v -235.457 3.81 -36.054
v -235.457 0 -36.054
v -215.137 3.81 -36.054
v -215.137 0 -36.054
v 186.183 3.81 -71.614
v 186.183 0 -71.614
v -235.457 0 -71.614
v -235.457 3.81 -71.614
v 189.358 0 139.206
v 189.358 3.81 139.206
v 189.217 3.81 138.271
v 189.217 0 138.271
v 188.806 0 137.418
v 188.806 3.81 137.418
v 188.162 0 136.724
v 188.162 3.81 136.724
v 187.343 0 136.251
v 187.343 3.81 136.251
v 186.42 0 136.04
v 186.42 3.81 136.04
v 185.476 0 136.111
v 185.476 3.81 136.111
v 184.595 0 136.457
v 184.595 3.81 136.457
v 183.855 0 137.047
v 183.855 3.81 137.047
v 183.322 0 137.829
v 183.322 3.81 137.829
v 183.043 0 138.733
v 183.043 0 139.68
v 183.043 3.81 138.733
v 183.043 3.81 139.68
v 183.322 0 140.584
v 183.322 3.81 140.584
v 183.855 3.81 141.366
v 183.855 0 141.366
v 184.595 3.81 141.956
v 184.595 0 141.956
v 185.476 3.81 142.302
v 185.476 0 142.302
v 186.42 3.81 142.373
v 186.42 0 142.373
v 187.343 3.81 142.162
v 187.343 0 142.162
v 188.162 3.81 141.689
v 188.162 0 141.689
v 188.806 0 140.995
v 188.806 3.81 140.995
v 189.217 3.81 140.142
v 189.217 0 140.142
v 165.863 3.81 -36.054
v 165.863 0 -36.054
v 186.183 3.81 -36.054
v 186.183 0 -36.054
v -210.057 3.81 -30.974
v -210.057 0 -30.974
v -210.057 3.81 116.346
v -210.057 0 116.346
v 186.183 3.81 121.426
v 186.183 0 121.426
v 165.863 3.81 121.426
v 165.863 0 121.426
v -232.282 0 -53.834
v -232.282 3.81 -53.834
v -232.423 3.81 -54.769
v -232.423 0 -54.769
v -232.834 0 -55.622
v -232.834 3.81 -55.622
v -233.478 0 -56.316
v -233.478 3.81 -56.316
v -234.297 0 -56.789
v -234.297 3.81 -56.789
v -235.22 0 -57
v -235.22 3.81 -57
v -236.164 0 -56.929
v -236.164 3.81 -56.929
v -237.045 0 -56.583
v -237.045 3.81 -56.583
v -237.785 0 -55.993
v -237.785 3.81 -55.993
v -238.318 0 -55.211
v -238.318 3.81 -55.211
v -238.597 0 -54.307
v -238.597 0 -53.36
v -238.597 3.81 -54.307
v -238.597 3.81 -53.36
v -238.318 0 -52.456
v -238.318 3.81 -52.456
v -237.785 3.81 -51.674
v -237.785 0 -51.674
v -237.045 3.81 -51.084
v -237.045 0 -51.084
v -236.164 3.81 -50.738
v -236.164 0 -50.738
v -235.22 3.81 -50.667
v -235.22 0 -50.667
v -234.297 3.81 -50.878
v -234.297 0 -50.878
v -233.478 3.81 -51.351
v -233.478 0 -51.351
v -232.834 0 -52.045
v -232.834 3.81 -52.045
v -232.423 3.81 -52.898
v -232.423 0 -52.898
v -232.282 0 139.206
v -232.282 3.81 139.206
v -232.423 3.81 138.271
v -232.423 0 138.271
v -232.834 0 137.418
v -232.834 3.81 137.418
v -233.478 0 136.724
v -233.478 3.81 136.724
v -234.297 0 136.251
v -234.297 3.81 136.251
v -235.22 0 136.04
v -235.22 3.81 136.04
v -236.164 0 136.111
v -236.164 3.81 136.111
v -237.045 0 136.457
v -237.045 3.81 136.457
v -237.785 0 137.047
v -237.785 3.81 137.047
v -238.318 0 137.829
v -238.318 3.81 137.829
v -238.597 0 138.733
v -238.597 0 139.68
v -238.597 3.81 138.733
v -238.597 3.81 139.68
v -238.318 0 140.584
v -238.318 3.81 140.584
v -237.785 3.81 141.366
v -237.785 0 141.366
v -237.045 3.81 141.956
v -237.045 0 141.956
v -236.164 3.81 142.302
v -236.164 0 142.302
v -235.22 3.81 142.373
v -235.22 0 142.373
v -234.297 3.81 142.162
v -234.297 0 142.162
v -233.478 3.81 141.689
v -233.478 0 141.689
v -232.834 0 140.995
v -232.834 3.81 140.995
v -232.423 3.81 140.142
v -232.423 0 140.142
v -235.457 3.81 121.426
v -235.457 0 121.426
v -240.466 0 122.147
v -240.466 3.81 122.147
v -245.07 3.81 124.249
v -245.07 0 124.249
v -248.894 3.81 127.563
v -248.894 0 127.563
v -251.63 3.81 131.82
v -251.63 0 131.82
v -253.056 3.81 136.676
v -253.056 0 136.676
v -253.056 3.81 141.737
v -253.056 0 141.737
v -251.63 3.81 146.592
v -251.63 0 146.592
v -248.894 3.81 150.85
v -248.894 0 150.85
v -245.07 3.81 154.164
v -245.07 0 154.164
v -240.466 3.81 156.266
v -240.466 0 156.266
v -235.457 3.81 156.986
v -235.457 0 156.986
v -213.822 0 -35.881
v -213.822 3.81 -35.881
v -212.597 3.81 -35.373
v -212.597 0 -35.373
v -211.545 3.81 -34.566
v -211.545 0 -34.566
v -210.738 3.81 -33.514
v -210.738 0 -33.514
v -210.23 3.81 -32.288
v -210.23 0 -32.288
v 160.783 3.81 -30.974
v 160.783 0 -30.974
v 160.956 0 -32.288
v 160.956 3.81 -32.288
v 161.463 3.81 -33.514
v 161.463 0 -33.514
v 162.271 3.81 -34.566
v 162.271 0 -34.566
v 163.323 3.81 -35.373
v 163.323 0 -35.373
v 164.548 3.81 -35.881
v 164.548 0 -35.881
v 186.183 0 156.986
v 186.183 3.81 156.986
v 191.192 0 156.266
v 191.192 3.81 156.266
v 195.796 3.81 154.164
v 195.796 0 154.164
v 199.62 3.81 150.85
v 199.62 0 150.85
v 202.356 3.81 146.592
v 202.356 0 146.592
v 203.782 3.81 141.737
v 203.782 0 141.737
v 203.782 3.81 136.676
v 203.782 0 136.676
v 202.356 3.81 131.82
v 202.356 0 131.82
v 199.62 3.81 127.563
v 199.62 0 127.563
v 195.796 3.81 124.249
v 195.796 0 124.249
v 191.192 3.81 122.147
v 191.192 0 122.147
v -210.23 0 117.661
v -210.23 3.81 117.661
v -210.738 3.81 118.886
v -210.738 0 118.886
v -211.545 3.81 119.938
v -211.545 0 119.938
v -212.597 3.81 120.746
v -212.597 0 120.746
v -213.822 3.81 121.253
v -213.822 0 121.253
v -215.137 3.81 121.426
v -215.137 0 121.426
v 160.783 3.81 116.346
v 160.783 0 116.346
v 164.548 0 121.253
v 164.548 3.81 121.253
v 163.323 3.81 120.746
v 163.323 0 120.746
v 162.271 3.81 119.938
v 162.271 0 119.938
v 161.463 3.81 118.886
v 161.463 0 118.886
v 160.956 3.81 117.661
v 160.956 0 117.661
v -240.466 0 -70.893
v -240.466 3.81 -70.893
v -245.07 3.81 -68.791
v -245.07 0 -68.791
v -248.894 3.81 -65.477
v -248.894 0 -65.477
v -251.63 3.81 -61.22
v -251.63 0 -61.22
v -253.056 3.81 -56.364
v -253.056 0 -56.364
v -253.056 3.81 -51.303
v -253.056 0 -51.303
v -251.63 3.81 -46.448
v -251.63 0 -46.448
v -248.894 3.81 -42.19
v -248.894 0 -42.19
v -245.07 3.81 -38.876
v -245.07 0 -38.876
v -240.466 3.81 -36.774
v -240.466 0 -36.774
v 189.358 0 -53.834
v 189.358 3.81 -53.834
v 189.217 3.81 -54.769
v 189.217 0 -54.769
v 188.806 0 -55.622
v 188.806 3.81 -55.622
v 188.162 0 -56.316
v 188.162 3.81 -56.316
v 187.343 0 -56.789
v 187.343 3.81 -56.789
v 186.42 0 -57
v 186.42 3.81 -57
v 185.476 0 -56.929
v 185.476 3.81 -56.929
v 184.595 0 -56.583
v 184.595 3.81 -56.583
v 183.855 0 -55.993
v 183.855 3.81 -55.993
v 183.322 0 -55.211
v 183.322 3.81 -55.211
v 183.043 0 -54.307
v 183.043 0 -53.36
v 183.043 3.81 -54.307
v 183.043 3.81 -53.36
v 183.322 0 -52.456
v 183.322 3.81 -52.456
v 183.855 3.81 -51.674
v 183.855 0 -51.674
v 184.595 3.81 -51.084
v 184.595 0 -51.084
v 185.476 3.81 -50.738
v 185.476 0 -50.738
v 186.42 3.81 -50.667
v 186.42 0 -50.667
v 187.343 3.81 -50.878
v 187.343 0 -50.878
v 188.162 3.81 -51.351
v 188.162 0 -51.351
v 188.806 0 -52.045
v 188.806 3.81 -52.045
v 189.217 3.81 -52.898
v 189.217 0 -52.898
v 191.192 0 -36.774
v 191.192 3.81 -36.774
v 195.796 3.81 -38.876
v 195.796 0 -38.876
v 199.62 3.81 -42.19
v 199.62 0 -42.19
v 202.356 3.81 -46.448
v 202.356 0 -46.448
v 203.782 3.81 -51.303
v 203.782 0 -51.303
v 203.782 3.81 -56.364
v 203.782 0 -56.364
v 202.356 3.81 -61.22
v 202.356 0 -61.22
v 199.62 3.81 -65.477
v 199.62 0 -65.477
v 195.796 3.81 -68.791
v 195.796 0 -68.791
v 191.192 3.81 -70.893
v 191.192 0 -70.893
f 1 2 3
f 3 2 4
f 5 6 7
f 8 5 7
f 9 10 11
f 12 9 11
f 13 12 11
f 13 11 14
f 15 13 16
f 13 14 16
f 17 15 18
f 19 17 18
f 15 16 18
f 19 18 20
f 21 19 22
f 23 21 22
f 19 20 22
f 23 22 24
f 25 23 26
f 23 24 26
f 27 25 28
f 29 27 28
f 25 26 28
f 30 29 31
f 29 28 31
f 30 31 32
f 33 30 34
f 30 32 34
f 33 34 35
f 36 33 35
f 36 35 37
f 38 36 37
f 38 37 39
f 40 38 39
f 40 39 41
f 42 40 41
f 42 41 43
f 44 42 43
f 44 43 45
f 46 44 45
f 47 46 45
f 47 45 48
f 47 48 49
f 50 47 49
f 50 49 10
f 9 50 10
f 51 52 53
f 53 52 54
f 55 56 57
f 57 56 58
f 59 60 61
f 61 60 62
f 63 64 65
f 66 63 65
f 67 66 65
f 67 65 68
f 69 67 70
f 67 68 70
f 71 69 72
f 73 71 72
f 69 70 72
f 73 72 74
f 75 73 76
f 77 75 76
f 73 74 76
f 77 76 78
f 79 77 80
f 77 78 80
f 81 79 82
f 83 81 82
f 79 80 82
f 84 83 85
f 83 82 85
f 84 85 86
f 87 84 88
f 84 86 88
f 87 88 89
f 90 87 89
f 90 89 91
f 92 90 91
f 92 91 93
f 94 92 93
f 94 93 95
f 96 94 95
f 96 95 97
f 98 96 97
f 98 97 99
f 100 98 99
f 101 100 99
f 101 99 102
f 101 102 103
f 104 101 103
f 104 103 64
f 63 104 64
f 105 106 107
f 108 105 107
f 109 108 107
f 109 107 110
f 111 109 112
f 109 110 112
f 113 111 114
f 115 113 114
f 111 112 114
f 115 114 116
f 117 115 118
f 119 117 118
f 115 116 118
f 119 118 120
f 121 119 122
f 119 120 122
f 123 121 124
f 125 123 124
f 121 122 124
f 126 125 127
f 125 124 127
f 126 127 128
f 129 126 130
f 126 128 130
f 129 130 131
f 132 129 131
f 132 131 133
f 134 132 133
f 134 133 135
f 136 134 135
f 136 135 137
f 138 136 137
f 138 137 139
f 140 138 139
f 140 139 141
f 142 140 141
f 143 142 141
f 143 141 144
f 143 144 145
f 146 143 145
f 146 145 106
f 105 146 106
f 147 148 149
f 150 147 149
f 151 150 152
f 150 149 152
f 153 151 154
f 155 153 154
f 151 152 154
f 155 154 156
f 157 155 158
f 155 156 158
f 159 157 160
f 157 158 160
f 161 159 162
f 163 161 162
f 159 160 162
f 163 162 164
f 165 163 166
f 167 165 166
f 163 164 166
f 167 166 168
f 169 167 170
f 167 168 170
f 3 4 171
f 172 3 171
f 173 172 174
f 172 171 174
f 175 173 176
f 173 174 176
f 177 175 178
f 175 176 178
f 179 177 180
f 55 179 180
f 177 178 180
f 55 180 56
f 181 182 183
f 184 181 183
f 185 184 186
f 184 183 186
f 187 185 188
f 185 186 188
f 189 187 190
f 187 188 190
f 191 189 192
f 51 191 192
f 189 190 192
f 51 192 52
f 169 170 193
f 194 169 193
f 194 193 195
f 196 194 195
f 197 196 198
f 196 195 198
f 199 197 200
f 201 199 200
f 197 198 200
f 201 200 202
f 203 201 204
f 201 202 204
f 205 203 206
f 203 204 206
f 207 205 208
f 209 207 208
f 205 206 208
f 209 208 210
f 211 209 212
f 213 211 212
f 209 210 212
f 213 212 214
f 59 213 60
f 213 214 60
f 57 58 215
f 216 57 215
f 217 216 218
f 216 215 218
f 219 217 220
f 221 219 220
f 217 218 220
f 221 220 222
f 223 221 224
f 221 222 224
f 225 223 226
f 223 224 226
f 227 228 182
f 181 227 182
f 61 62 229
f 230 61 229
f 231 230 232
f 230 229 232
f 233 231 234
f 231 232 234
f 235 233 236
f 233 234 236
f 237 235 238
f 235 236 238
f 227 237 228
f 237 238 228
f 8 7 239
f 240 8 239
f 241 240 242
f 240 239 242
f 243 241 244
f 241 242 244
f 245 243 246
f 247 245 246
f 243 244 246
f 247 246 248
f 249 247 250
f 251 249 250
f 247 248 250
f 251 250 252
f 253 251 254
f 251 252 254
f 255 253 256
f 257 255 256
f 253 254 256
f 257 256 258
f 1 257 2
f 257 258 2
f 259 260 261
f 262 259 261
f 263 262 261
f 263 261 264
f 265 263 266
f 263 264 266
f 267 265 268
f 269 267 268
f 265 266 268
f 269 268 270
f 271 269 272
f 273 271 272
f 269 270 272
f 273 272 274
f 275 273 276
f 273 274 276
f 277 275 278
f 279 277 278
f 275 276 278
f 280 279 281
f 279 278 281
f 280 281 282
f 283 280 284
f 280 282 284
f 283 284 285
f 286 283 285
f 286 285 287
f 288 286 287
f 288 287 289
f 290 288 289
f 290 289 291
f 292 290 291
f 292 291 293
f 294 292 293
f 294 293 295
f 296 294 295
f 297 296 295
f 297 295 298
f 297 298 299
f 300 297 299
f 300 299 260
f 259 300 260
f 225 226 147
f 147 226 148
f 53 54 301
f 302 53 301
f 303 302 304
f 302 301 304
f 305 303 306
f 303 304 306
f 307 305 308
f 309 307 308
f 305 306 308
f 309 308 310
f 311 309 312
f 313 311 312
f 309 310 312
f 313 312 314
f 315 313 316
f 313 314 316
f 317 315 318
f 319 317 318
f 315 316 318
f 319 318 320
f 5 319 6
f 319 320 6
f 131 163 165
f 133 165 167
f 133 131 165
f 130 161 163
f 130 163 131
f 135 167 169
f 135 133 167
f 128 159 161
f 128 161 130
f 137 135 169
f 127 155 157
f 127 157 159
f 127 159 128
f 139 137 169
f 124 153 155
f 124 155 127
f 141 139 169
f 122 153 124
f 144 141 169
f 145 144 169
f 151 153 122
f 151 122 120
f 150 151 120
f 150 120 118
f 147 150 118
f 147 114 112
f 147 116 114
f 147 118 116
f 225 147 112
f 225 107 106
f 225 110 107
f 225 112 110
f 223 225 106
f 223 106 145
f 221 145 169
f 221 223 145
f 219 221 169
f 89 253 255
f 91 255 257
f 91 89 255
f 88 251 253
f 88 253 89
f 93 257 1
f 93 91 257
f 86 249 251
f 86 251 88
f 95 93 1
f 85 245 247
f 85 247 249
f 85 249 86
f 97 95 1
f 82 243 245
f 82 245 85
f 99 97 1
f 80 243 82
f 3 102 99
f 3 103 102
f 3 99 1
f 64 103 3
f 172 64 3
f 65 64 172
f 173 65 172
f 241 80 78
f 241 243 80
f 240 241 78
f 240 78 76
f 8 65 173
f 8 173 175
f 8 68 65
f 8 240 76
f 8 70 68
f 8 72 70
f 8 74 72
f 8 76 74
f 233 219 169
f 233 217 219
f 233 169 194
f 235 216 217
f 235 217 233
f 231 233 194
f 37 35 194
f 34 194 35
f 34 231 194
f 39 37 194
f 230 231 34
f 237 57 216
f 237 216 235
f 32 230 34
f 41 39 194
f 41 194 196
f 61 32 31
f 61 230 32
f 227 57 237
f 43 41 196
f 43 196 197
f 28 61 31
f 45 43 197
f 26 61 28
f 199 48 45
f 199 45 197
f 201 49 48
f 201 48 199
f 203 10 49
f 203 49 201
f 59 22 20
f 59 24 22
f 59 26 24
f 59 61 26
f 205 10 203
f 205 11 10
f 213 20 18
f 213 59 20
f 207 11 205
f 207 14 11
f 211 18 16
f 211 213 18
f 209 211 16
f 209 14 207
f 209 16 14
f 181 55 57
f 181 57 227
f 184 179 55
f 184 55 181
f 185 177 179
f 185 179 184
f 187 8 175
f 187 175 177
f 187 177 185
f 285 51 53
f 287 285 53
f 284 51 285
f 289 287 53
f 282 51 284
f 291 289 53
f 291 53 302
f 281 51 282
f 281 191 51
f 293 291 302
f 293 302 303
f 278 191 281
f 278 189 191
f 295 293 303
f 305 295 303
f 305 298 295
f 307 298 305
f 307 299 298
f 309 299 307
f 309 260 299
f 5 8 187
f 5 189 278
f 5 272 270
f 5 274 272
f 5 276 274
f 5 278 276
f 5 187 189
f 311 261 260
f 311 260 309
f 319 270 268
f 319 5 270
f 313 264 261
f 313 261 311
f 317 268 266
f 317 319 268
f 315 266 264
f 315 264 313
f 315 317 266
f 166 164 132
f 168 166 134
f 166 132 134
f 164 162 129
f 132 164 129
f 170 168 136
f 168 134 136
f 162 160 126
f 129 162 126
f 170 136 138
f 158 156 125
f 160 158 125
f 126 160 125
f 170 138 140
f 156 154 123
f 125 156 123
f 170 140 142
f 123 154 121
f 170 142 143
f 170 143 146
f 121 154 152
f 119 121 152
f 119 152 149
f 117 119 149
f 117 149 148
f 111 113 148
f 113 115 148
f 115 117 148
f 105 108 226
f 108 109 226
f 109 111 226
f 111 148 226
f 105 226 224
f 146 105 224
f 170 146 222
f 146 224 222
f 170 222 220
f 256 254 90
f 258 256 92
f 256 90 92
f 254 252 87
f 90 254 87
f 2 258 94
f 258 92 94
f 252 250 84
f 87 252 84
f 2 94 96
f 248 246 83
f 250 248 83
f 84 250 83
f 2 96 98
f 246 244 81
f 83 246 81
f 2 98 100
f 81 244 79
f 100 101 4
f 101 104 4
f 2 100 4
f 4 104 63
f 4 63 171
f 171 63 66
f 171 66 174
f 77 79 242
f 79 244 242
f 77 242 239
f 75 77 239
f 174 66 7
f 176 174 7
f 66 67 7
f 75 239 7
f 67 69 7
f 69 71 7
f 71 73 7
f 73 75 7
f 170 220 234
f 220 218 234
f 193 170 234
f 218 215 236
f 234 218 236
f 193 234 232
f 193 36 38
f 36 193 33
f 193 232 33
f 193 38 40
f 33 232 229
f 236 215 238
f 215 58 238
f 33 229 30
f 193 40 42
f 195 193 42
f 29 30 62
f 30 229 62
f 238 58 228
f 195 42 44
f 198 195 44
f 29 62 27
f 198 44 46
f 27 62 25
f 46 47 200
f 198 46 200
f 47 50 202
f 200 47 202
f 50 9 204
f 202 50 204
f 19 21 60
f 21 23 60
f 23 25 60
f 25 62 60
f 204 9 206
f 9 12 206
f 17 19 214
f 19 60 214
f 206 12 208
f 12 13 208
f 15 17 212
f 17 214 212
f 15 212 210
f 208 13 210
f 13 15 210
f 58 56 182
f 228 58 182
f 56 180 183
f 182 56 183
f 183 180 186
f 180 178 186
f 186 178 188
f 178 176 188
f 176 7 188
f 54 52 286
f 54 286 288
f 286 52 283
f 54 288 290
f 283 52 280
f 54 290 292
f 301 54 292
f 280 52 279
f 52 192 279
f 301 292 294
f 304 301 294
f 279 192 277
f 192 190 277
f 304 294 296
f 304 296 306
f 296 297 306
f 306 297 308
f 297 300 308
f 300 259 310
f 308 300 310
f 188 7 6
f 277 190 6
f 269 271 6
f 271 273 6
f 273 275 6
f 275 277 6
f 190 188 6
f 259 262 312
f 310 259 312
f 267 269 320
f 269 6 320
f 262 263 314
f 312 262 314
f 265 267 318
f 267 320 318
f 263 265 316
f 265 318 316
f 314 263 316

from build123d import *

# Parameters (mm, degrees)
BOSS_EXTRUDE1_DEPTH = 3.81
SKETCH2_R           = 3.175
CUT_EXTRUDE1_DEPTH  = 85.852


with BuildPart() as part:
    # Sketch1 → Boss-Extrude1 (new body)
    with BuildSketch(Plane(origin=(0, 0, 0), x_dir=(1, 0, 0), z_dir=(0, 1, 0))):
        with BuildLine():
            Line((-106.328404832, 71.61361972), (-235.457093287, 71.61361972))
            ThreePointArc((-235.457093287, 71.61361972), (-253.237093287, 53.83361972), (-235.457093287, 36.05361972))
            Line((-235.457093287, 36.05361972), (-215.137093287, 36.05361972))
            ThreePointArc((-215.137093287, 36.05361972), (-211.544990839, 34.565722168), (-210.057093287, 30.97361972))
            Line((-210.057093287, 30.97361972), (-210.057093287, -116.34638028))
            ThreePointArc((-210.057093287, -116.34638028), (-211.544990839, -119.938482729), (-215.137093287, -121.42638028))
            Line((-215.137093287, -121.42638028), (-235.457093287, -121.42638028))
            ThreePointArc((-235.457093287, -121.42638028), (-253.237093287, -139.20638028), (-235.457093287, -156.98638028))
            Line((-235.457093287, -156.98638028), (-106.328404832, -156.98638028))
            Line((-106.328404832, -156.98638028), (160.782906713, -156.98638028))
            Line((160.782906713, -156.98638028), (186.182906713, -156.98638028))
            ThreePointArc((186.182906713, -156.98638028), (203.962906713, -139.20638028), (186.182906713, -121.42638028))
            Line((186.182906713, -121.42638028), (165.862906713, -121.42638028))
            ThreePointArc((165.862906713, -121.42638028), (162.270804264, -119.938482729), (160.782906713, -116.34638028))
            Line((160.782906713, -116.34638028), (160.782906713, 30.97361972))
            ThreePointArc((160.782906713, 30.97361972), (162.270804264, 34.565722168), (165.862906713, 36.05361972))
            Line((165.862906713, 36.05361972), (186.182906713, 36.05361972))
            ThreePointArc((186.182906713, 36.05361972), (203.962906713, 53.83361972), (186.182906713, 71.61361972))
            Line((186.182906713, 71.61361972), (160.782906713, 71.61361972))
            Line((160.782906713, 71.61361972), (-106.328404832, 71.61361972))
        make_face()
    extrude(amount=BOSS_EXTRUDE1_DEPTH)

    # Sketch2 → Cut-Extrude1 (cut)
    with BuildSketch(Plane(origin=(0, 3.81, 0), x_dir=(1, 0, 0), z_dir=(0, 1, 0))):
        with Locations((-235.457093287, 53.83361972)):
            Circle(SKETCH2_R)
        with Locations((186.182906713, 53.83361972)):
            Circle(SKETCH2_R)
        with Locations((186.182906713, -139.20638028)):
            Circle(SKETCH2_R)
        with Locations((-235.457093287, -139.20638028)):
            Circle(SKETCH2_R)
    extrude(amount=-CUT_EXTRUDE1_DEPTH, mode=Mode.SUBTRACT)


solid = part.part
